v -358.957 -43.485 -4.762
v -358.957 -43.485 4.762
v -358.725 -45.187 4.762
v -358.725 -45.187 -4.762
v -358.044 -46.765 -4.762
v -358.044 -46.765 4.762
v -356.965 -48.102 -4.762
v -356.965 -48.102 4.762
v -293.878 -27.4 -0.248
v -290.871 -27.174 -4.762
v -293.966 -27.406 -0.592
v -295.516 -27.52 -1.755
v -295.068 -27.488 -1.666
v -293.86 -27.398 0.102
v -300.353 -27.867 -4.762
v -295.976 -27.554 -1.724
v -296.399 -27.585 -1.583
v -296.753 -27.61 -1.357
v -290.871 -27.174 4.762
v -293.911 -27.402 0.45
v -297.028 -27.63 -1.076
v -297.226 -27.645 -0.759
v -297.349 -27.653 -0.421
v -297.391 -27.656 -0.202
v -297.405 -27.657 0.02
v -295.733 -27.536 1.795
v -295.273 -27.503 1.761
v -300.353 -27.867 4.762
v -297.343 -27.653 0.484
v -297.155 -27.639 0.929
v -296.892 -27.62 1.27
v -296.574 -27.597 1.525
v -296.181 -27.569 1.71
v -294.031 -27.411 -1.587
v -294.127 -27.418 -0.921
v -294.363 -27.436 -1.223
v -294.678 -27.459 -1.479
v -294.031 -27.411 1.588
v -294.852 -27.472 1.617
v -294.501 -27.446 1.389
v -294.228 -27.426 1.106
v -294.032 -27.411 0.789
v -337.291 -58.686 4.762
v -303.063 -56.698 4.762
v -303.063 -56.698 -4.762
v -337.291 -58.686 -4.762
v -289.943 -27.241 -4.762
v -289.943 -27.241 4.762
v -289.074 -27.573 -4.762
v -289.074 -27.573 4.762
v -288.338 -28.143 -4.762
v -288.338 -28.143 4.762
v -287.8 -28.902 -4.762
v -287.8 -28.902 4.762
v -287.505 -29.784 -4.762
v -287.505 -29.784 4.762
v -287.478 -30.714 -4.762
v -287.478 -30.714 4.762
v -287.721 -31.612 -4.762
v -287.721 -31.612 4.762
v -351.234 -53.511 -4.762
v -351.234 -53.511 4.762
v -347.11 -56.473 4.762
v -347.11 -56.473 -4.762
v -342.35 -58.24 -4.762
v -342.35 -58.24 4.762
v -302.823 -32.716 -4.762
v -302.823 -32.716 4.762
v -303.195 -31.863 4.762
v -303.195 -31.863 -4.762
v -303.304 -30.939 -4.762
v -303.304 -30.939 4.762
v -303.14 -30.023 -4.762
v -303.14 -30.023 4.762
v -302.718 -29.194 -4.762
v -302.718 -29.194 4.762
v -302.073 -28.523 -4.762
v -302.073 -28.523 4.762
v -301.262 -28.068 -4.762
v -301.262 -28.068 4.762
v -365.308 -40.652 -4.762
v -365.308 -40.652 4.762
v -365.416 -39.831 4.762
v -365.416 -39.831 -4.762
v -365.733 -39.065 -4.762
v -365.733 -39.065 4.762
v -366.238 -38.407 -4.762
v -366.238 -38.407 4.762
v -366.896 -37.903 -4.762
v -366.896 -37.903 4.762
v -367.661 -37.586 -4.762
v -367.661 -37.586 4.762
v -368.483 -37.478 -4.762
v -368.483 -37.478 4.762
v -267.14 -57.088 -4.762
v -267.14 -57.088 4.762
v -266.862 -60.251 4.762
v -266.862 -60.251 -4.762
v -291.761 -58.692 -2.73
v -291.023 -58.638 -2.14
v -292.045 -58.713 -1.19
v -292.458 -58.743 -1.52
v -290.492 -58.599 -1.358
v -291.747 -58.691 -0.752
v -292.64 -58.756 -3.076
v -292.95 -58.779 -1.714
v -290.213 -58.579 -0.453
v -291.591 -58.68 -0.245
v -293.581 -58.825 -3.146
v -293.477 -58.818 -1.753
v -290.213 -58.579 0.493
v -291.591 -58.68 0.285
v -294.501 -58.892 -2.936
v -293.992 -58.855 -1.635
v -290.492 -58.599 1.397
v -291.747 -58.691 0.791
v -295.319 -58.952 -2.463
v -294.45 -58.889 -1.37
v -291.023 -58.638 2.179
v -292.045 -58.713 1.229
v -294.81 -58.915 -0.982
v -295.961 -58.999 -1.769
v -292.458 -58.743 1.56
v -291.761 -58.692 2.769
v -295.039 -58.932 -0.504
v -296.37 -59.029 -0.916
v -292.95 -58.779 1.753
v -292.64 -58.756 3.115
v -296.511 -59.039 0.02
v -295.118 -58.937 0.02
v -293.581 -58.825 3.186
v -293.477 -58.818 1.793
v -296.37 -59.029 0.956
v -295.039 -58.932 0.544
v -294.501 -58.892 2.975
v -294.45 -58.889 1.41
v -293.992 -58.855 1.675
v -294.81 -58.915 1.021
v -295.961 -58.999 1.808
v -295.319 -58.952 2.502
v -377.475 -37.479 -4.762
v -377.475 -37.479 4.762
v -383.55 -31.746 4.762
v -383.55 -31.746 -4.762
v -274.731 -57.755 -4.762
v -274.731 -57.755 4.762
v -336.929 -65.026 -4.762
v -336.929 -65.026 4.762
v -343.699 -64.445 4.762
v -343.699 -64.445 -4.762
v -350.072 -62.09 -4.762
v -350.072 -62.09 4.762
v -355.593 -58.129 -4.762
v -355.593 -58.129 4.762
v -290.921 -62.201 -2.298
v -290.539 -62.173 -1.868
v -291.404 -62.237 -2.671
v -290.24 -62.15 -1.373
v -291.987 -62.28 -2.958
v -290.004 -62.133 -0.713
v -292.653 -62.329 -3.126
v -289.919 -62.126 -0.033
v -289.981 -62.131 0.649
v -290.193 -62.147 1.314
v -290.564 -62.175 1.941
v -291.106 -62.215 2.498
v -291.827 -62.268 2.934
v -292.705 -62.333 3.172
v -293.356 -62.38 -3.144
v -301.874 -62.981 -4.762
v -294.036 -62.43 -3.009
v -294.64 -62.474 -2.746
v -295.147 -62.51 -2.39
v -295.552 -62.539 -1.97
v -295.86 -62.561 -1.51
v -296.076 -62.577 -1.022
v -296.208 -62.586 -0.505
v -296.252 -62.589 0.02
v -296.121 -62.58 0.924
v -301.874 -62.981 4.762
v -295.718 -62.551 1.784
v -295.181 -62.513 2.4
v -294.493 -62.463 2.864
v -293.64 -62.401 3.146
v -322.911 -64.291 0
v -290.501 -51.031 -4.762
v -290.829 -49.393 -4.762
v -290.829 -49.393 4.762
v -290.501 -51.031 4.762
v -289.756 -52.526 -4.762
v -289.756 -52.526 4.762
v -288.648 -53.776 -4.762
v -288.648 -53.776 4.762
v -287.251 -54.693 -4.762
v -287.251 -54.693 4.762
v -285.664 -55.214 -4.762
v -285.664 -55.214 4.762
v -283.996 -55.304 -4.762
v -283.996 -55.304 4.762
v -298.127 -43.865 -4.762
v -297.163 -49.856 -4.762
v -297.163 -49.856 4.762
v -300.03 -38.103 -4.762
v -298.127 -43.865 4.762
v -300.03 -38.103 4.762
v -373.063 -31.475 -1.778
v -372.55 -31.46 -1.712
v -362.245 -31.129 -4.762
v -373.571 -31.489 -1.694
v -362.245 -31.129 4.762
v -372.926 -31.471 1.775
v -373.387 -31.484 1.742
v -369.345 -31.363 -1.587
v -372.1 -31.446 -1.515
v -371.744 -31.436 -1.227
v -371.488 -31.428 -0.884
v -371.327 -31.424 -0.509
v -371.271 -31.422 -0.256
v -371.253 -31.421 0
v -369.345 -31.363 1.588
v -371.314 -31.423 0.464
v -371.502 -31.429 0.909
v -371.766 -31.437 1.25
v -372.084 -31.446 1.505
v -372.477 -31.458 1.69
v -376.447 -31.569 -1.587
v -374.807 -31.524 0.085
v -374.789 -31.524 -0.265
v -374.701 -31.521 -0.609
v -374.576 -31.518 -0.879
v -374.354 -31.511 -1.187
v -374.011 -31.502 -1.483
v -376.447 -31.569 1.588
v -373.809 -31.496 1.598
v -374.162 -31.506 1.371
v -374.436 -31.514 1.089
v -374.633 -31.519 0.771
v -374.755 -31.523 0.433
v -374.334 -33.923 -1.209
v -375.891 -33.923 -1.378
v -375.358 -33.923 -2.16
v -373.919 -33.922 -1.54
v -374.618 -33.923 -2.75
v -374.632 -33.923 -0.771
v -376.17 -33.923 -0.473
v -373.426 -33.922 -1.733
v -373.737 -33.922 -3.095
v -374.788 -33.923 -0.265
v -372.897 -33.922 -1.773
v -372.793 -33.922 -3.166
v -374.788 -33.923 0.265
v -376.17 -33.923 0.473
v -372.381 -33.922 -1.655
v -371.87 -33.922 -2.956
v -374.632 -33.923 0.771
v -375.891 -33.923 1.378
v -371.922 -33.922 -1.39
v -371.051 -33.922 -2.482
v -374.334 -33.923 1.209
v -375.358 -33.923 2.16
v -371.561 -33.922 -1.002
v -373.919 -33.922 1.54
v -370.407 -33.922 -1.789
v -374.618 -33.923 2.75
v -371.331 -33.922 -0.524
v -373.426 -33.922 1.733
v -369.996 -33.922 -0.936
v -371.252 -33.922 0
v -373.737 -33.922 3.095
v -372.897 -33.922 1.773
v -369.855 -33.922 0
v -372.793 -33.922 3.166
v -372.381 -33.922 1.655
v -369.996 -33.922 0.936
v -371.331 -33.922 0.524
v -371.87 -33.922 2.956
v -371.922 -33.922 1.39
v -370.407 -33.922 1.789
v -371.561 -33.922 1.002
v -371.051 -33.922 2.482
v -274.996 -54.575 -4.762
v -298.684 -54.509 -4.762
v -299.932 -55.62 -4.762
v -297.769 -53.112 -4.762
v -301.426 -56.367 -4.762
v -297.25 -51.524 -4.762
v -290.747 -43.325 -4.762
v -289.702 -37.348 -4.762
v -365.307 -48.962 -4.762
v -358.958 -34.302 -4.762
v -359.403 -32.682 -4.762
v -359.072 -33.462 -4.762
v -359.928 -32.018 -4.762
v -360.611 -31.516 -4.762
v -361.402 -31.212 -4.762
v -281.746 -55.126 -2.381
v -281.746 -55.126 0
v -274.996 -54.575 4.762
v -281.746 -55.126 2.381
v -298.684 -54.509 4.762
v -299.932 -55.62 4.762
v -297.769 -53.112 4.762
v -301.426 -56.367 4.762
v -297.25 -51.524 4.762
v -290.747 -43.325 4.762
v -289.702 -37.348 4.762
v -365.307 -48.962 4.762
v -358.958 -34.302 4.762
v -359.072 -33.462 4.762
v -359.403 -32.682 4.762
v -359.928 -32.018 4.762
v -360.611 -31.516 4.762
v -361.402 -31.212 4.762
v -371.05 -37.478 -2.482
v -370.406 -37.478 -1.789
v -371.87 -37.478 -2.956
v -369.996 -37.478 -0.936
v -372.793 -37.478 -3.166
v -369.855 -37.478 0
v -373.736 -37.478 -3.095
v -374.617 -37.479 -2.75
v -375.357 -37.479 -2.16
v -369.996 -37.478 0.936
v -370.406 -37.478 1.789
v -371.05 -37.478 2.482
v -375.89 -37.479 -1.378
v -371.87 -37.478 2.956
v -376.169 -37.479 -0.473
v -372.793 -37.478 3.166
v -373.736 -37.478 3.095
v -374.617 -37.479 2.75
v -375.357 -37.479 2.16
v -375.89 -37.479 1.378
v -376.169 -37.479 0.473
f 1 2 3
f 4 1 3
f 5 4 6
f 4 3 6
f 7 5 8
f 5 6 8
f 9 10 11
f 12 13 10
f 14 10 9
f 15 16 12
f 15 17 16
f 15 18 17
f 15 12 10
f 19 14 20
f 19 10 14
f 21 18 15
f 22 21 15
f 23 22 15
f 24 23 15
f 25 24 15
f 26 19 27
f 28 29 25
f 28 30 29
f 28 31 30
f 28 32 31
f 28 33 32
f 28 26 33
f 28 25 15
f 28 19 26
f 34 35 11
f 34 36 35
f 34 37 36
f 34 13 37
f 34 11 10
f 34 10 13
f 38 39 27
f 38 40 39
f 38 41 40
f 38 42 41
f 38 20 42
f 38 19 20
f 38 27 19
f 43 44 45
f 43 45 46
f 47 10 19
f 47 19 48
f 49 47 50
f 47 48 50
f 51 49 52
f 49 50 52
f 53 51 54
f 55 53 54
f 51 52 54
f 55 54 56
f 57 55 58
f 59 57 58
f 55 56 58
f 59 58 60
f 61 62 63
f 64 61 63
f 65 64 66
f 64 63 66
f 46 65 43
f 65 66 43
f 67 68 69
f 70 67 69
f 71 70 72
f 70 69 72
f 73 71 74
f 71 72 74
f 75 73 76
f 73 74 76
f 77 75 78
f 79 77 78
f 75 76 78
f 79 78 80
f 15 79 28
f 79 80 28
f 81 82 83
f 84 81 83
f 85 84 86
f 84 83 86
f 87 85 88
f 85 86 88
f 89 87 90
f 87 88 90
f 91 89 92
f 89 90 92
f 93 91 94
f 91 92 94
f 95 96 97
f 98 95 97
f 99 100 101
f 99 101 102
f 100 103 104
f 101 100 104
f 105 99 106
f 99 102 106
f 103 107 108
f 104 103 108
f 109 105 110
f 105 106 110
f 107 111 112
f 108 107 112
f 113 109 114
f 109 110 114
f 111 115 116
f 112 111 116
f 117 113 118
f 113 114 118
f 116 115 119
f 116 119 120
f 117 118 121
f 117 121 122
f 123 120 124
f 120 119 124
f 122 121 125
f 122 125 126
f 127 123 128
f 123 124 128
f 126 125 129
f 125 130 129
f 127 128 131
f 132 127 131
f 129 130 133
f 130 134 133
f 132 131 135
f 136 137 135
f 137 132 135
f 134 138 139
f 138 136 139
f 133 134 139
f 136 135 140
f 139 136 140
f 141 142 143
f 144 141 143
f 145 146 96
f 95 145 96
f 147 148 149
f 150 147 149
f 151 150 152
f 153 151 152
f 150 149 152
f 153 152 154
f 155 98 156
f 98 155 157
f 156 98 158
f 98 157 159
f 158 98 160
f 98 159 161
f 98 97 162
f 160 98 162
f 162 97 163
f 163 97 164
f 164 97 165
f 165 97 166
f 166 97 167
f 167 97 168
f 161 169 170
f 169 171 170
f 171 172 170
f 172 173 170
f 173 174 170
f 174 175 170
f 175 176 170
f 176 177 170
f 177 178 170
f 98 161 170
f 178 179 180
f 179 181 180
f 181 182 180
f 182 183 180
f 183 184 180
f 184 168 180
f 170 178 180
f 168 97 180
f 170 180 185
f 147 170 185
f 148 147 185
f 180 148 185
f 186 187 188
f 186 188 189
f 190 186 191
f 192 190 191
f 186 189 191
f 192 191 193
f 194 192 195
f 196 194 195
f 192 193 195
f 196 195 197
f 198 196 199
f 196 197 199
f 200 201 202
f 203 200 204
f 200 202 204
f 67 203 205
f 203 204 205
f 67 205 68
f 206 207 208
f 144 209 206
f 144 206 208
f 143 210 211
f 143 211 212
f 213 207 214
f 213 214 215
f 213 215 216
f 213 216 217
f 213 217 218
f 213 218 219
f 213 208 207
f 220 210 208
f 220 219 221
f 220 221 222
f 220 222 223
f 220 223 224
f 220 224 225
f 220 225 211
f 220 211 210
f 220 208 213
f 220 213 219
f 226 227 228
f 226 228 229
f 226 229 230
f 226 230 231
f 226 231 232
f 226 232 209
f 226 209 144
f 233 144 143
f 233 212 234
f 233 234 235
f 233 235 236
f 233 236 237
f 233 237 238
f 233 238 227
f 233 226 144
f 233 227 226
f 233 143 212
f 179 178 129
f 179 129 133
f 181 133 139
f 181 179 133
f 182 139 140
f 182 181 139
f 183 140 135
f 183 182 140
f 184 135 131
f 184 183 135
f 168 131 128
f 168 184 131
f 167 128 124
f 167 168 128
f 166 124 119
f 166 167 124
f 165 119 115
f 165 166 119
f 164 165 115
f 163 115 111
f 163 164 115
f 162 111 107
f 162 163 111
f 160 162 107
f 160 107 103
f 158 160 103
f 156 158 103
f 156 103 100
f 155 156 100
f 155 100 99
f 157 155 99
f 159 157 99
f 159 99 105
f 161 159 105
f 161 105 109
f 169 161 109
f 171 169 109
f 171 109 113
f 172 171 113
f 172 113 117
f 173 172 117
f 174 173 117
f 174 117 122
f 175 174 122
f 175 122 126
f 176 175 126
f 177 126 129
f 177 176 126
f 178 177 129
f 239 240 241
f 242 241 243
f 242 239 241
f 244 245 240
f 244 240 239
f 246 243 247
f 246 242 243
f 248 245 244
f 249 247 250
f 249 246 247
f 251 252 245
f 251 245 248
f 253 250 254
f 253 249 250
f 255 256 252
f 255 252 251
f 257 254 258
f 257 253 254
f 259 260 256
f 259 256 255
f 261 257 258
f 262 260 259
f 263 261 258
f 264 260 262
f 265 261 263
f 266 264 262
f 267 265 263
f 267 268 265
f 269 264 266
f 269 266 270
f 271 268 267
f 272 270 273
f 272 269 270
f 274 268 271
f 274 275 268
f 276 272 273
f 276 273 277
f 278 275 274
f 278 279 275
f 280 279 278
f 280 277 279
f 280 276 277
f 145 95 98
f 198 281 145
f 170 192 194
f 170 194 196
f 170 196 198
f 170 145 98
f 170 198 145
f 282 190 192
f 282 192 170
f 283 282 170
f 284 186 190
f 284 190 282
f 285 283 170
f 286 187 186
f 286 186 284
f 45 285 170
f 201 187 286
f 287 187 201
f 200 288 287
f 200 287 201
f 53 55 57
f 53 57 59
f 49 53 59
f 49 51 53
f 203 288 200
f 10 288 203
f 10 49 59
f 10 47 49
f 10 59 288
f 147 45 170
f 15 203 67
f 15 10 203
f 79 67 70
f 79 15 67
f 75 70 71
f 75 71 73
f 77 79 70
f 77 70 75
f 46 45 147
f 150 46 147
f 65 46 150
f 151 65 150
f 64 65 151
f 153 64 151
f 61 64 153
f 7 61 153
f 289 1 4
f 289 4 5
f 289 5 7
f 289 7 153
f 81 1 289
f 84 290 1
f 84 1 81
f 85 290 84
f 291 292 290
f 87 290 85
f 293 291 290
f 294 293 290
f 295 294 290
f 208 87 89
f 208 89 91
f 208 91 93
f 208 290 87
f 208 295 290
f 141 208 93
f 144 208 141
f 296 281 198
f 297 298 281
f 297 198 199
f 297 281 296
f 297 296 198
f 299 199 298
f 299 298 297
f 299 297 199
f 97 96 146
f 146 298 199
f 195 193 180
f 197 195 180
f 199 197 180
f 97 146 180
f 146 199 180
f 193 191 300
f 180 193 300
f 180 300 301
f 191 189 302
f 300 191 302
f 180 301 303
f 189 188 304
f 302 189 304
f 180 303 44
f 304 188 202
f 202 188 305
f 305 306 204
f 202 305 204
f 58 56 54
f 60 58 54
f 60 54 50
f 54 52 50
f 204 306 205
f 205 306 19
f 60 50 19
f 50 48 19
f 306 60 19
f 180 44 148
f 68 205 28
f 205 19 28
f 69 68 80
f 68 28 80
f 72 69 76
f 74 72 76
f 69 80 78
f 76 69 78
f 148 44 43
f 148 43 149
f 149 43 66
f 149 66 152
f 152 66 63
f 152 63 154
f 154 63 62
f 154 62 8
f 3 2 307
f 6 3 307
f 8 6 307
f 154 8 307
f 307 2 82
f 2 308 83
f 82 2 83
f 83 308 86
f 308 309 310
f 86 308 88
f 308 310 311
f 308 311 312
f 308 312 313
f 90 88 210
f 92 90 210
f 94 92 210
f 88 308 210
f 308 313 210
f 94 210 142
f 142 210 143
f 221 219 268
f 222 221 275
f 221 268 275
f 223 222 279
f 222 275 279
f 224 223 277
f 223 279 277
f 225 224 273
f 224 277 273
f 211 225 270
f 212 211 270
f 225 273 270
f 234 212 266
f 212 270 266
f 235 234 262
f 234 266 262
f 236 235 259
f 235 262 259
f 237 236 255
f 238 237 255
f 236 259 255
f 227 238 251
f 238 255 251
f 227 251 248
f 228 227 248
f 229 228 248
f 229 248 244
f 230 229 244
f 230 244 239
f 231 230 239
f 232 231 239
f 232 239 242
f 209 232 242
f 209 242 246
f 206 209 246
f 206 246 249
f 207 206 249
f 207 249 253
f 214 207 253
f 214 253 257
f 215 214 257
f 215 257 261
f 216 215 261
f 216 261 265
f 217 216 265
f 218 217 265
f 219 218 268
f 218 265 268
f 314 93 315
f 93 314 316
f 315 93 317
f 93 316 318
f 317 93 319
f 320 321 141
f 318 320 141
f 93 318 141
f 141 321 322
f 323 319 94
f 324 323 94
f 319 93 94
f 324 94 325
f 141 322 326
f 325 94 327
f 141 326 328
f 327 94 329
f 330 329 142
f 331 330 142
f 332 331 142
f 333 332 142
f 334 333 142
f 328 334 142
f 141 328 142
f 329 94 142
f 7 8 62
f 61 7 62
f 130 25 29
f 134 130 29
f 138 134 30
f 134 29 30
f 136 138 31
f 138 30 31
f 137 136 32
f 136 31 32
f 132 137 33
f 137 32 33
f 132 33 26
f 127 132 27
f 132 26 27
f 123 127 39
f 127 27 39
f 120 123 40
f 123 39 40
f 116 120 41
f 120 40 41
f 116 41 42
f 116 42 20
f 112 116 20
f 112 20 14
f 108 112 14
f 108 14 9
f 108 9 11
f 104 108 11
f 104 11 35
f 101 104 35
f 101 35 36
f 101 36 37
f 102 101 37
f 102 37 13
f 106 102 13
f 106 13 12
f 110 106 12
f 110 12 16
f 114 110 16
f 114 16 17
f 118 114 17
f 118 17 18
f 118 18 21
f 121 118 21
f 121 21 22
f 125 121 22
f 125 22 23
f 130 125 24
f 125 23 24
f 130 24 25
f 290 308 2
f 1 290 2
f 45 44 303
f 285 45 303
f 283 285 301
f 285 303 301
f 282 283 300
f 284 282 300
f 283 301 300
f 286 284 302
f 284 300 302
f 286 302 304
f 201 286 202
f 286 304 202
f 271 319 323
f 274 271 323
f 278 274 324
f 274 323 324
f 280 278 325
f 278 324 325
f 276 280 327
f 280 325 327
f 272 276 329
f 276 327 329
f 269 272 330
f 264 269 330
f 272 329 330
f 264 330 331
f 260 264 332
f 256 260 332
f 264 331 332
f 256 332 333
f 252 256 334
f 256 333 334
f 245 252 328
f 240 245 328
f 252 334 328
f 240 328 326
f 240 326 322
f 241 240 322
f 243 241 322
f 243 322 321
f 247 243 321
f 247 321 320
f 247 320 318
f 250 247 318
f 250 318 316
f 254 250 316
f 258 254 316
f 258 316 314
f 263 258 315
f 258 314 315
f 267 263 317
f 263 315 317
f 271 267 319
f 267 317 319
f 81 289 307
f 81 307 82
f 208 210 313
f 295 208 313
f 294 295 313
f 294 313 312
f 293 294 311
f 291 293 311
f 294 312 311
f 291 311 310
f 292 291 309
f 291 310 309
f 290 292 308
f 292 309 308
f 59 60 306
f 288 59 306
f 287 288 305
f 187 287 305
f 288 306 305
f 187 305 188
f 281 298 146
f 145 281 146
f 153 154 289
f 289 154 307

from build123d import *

# Parameters (mm, degrees)
BOSS_EXTRUDE1_START     = -4.7625
BOSS_EXTRUDE1_DEPTH     = 9.525
SKETCH4_R               = 3.175
CUT_EXTRUDE1_DEPTH      = 3.556
SKETCH5_R               = 1.778
CUT_EXTRUDE2_DEPTH      = 3.556
SKETCH6_R               = 1.778
CUT_EXTRUDE3_DEPTH      = 389.542033304
CUT_EXTRUDE4_DEPTH      = 3.556
CUT_EXTRUDE4_DEPTH_BACK = 388.321146479
SKETCH7_R               = 3.175
SKETCH7_R_2             = 1.778


# Read off the part's stored shape, not the designer's step: Boss-Extrude1
with BuildPart() as part:
    # Boss-Extrude1 outline → Boss-Extrude1 (new body)
    with BuildSketch(Plane(origin=(-0.151105159, 1.836314253, 0), x_dir=(-0.9999999911893379, -0.00013274533532885028, 0), z_dir=(0, 0, -1)).offset(BOSS_EXTRUDE1_START)):
        with BuildLine():
            add(Edge.make_bspline(
                [(266.719101765, -62.051598198), (285.372886056, -63.687772151), (308.740732669, -65.369335536), (332.113756278, -66.591725825), (336.786834388, -66.817774574)],
                knots=[0, 0, 0, 0, 0.444589519, 0.555671616, 0.555671616, 0.555671616, 0.555671616], degree=3))
            ThreePointArc((336.786834388, -66.817774574), (346.821832777, -65.271443631), (355.449407296, -59.918193219))
            Line((355.449407296, -59.918193219), (365.162167793, -50.749897782))
            Line((365.162167793, -50.749897782), (365.162167793, -42.440188824))
            ThreePointArc((365.162167793, -42.440188824), (366.092103763, -40.195124794), (368.337167793, -39.265188824))
            Line((368.337167793, -39.265188824), (377.328903503, -39.265188824))
            Line((377.328903503, -39.265188824), (383.403102119, -33.531489588))
            add(Edge.make_bspline(
                [(362.097911235, -32.917120768), (369.197743206, -33.164912437), (376.299473684, -33.369697882), (383.403102119, -33.531489588)],
                knots=[0.746516847, 0.746516847, 0.746516847, 0.746516847, 0.918535276, 0.918535276, 0.918535276, 0.918535276], degree=3))
            ThreePointArc((362.097911235, -32.917120768), (359.781604988, -33.806306666), (358.812167793, -36.090188824))
            Line((358.812167793, -36.090188824), (358.812167793, -45.273612359))
            ThreePointArc((358.812167793, -45.273612359), (358.293167277, -47.787960192), (356.821004007, -49.891300836))
            Line((356.821004007, -49.891300836), (351.090571083, -55.300504742))
            ThreePointArc((351.090571083, -55.300504742), (344.645600305, -59.305916448), (337.148417456, -60.4777614))
            add(Edge.make_bspline(
                [(302.92001028, -58.493795672), (304.509330321, -58.60122978), (315.913868956, -59.356827875), (327.324554644, -60.002877801), (337.148417456, -60.4777614)],
                knots=[0.283817359, 0.283817359, 0.283817359, 0.283817359, 0.321763123, 0.556088201, 0.556088201, 0.556088201, 0.556088201], degree=3))
            ThreePointArc((302.92001028, -58.493795672), (298.540134178, -56.306049329), (297.01844307, -51.652662937))
            ThreePointArc((297.01844307, -51.652662937), (298.817944258, -42.742557946), (302.676848033, -34.512306606))
            ThreePointArc((302.676848033, -34.512306606), (302.812285866, -31.389489502), (300.205974442, -29.663954561))
            add(Edge.make_bspline(
                [(290.723349608, -28.971987248), (293.88384664, -29.211203734), (297.044721601, -29.441859136), (300.205974442, -29.663954561)],
                knots=[0.169565869, 0.169565869, 0.169565869, 0.169565869, 0.246277706, 0.246277706, 0.246277706, 0.246277706], degree=3))
            ThreePointArc((290.723349608, -28.971987248), (287.894150829, -30.300881632), (287.574810624, -33.410278334))
            ThreePointArc((287.574810624, -33.410278334), (290.198038966, -42.113548005), (290.684983891, -51.190503181))
            ThreePointArc((290.684983891, -51.190503181), (288.503875799, -55.573685628), (283.852803221, -57.102425178))
            add(Edge.make_bspline(
                [(274.852701957, -56.374410111), (275.484326416, -56.427106964), (276.92498218, -56.546530571), (279.175001885, -56.730301658), (281.5434013, -56.92049496), (283.102708442, -57.04365577), (283.852803221, -57.102425178)],
                knots=[0.060364421, 0.060364421, 0.060364421, 0.060364421, 0.075455527, 0.094786271, 0.114117015, 0.132034547, 0.132034547, 0.132034547, 0.132034547], degree=3))
            Line((274.852701957, -56.374410111), (274.587380233, -59.554556157))
            Line((274.587380233, -59.554556157), (266.996524483, -58.888741635))
            Line((266.996524483, -58.888741635), (266.719101765, -62.051598198))
        make_face()
    extrude(amount=BOSS_EXTRUDE1_DEPTH)

    # Sketch4 → Cut-Extrude1 (cut)
    with BuildSketch(Plane(origin=(0.004968506, -37.428854199, 0), x_dir=(-0.999999991182225, -0.00013274533532793586, -3.771739900033909e-06), z_dir=(0.00013274533532888006, -0.999999991189338, 0))):
        with Locations(Location((373.034764896, -0.001423755, 0), (0, 0, 179.999783895))):
            Circle(SKETCH4_R)
    extrude(amount=-CUT_EXTRUDE1_DEPTH, mode=Mode.SUBTRACT)

    # Sketch5 → Cut-Extrude2 (cut)
    with BuildSketch(Plane(origin=(0.004496463, -33.872854231, 0), x_dir=(-0.999999991182225, -0.00013274533532793586, -3.771739900033909e-06), z_dir=(0.00013274533532888006, -0.9999999911893379, 0))):
        with Locations(Location((373.034764896, -0.001423755, 0), (0, 0, 179.999783895))):
            Circle(SKETCH5_R)
    extrude(amount=-CUT_EXTRUDE2_DEPTH, mode=Mode.SUBTRACT)

    # Sketch6 → Cut-Extrude3 (cut, through all)
    with BuildSketch(Plane(origin=(0.429757188, -5.878582453, 0), x_dir=(0.9973298035047504, 0.0729103752016881, 0.004164160074363476), z_dir=(-0.07291100735121511, 0.9973384505808602, 0))):
        with Locations(Location((-296.848920319, -1.255850637, 0), (0, 0, 180.238589487))):
            Circle(SKETCH6_R)
    extrude(amount=-CUT_EXTRUDE3_DEPTH, mode=Mode.SUBTRACT)

    # Sketch7 → Cut-Extrude4 (cut, two sides: drawn at the far end of the back side and taken through both)
    with BuildSketch(Plane(origin=(2.97617412, -40.71062784, 0), x_dir=(0.9973298035047504, 0.0729103752016881, 0.004164160074363476), z_dir=(-0.07291100735121511, 0.9973384505808603, 0)).offset(-CUT_EXTRUDE4_DEPTH_BACK)):
        with Locations(Location((-296.848920319, -1.255850637, 0), (0, 0, 180.238589487))):
            Circle(SKETCH7_R)
        with Locations(Location((-296.848920319, -1.255850637, 0), (0, 0, 180.238589487))):
            Circle(SKETCH7_R_2, mode=Mode.SUBTRACT)
    extrude(amount=CUT_EXTRUDE4_DEPTH + CUT_EXTRUDE4_DEPTH_BACK, mode=Mode.SUBTRACT)


solid = part.part
